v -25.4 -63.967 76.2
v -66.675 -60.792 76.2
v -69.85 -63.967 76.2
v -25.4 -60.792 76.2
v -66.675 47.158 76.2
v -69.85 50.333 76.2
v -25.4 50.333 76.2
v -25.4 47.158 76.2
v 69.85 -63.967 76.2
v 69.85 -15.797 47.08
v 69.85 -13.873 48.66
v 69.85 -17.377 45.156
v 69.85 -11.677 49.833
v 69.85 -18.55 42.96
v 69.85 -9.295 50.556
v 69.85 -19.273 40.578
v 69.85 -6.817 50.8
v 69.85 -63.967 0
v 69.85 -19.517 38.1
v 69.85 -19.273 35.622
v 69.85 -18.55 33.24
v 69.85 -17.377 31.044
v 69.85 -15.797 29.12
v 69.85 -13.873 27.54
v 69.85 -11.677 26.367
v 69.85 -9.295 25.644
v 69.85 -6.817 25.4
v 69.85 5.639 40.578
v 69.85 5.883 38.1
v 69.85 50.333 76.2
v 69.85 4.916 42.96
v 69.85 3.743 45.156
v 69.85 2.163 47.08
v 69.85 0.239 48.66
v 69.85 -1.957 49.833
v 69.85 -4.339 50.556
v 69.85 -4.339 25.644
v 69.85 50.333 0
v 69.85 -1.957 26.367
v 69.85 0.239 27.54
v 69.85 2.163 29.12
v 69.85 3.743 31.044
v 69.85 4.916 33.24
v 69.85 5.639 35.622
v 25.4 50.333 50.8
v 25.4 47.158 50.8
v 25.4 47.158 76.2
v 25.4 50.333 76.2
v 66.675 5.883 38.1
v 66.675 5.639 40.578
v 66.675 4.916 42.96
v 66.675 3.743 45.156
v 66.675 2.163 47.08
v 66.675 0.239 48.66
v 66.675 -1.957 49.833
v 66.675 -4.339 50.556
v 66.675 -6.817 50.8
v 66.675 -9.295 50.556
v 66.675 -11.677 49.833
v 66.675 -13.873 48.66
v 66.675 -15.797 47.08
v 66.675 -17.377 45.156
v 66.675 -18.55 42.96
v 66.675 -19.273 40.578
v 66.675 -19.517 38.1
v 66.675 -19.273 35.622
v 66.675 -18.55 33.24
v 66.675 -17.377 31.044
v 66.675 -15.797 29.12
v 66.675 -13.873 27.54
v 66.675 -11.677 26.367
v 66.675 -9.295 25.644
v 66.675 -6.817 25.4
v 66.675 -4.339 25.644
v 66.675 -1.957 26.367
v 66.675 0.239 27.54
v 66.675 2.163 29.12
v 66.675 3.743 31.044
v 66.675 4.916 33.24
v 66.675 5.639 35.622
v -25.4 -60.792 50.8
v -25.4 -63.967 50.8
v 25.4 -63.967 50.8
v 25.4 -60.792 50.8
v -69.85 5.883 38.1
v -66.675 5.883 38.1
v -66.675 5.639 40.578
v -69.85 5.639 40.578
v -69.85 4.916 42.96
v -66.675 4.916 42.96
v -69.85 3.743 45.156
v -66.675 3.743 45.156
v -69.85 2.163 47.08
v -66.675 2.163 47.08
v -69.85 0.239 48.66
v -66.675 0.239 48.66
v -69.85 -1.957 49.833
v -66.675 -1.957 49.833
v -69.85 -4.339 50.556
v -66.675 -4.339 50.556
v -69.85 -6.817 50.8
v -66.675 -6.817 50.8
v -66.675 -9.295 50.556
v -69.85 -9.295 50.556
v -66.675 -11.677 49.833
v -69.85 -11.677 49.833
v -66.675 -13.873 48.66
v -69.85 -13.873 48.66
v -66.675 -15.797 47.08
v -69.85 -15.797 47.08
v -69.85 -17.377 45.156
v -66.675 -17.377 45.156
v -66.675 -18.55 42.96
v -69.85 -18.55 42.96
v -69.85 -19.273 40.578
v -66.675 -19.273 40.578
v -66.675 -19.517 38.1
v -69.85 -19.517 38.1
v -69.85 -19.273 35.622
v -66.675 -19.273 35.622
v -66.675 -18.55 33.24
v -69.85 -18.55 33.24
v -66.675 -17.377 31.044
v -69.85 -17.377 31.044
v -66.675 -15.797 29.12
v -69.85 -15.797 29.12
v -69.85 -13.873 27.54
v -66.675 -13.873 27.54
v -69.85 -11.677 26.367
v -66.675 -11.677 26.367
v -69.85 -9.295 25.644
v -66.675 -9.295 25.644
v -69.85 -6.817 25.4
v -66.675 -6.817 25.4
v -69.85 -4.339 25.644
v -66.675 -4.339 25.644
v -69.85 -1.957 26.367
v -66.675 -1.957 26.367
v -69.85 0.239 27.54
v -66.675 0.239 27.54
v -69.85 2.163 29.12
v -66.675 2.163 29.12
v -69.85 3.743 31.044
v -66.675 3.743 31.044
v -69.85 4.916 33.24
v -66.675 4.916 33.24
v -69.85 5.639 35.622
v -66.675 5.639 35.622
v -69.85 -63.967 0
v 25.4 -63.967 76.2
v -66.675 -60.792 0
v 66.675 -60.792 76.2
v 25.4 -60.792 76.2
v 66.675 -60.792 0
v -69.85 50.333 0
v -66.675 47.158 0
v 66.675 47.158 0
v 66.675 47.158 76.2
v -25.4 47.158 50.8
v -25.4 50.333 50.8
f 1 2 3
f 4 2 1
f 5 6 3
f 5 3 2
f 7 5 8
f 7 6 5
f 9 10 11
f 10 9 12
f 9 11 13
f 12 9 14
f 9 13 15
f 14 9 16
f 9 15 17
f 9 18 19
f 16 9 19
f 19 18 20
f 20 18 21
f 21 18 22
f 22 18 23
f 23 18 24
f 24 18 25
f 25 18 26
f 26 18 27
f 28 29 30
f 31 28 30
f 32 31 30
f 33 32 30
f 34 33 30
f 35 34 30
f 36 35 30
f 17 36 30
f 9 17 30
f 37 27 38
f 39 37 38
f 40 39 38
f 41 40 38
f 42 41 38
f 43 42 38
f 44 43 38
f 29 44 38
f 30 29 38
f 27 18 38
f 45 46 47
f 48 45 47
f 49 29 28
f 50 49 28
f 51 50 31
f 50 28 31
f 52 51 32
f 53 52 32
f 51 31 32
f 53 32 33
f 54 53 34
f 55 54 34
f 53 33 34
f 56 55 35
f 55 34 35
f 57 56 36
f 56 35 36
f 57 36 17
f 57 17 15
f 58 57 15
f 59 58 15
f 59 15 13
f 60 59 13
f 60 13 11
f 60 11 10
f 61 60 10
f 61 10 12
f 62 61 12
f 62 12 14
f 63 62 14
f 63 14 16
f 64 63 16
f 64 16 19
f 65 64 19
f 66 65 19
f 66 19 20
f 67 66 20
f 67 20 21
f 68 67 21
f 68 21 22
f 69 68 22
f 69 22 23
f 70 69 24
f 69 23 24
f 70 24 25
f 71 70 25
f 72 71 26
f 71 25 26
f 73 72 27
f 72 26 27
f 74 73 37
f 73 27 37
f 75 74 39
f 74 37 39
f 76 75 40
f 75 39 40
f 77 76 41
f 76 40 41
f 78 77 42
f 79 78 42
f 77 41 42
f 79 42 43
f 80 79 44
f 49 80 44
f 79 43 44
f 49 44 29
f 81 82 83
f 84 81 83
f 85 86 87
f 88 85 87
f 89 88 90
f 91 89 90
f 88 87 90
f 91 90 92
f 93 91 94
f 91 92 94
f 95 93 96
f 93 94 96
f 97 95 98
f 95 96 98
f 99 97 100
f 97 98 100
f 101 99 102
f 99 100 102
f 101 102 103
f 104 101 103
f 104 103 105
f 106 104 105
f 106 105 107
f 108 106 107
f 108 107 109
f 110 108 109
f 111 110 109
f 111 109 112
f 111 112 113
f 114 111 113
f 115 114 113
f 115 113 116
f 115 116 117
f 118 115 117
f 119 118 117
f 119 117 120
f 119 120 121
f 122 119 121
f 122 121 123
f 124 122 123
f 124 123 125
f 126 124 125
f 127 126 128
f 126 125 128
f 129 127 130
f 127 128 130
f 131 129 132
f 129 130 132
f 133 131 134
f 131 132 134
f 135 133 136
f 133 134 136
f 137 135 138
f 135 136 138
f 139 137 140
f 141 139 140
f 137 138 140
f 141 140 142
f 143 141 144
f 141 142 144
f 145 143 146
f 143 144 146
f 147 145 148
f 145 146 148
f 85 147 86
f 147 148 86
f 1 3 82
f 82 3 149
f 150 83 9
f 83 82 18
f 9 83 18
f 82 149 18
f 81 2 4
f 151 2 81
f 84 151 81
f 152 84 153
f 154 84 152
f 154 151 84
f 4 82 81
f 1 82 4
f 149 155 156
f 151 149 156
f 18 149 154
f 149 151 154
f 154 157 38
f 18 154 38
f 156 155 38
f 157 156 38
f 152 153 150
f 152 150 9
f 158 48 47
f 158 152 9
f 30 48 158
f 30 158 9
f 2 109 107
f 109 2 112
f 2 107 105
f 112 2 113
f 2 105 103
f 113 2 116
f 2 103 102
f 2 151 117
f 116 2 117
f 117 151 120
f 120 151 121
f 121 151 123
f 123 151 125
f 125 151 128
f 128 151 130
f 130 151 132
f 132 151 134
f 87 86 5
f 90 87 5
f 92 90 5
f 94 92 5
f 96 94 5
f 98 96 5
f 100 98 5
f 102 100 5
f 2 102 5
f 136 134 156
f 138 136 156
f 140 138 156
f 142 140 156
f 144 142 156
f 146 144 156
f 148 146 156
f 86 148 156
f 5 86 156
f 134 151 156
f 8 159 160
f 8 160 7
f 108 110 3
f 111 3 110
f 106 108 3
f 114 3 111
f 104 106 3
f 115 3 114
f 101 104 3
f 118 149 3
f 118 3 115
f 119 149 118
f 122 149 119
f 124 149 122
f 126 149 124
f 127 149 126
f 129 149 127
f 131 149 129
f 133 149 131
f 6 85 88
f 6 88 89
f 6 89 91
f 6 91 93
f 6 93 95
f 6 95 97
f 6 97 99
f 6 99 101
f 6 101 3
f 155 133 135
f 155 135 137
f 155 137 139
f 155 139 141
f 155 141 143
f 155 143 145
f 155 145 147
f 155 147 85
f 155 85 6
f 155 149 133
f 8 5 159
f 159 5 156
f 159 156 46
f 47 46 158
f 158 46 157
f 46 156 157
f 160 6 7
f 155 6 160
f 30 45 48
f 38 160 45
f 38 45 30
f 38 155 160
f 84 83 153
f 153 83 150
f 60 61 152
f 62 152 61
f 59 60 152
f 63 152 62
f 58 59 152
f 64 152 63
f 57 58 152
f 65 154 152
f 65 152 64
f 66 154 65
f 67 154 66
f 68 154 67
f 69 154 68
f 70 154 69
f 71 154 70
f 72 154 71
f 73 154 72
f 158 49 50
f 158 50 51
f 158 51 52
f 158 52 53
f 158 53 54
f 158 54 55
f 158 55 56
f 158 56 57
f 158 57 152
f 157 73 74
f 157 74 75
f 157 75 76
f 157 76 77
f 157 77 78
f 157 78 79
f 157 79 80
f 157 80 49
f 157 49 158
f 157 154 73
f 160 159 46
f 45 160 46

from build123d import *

# Parameters (mm, degrees)
F0_W     = 139.7
F0_H     = 114.3
F0_W_2   = 133.35
F0_H_2   = 107.95
F1_DEPTH = 76.2
F2_W     = 50.8
F2_H     = 50.8
F3_DEPTH = 127
F4_R     = 12.7
F5_DEPTH = 175.768


with BuildPart() as f1:
    # F0 (on Top) → F1 (new body)
    with BuildSketch(Plane.XY):
        with Locations((0, -6.816931)):
            Rectangle(F0_W, F0_H)
        with Locations((0, -6.816931)):
            Rectangle(F0_W_2, F0_H_2, mode=Mode.SUBTRACT)
    extrude(amount=F1_DEPTH)

    # F2 (on face) → F3 (cut)
    with BuildSketch(Plane.XZ.offset(63.966931)):
        with Locations((0, 76.2)):
            Rectangle(F2_W, F2_H)
    extrude(amount=-F3_DEPTH, mode=Mode.SUBTRACT)

    # F4 (on face) → F5 (cut)
    with BuildSketch(Plane.YZ.offset(69.85)):
        with Locations((-6.816931, 38.1)):
            Circle(F4_R)
    extrude(amount=-F5_DEPTH, mode=Mode.SUBTRACT)


solid = f1.part
